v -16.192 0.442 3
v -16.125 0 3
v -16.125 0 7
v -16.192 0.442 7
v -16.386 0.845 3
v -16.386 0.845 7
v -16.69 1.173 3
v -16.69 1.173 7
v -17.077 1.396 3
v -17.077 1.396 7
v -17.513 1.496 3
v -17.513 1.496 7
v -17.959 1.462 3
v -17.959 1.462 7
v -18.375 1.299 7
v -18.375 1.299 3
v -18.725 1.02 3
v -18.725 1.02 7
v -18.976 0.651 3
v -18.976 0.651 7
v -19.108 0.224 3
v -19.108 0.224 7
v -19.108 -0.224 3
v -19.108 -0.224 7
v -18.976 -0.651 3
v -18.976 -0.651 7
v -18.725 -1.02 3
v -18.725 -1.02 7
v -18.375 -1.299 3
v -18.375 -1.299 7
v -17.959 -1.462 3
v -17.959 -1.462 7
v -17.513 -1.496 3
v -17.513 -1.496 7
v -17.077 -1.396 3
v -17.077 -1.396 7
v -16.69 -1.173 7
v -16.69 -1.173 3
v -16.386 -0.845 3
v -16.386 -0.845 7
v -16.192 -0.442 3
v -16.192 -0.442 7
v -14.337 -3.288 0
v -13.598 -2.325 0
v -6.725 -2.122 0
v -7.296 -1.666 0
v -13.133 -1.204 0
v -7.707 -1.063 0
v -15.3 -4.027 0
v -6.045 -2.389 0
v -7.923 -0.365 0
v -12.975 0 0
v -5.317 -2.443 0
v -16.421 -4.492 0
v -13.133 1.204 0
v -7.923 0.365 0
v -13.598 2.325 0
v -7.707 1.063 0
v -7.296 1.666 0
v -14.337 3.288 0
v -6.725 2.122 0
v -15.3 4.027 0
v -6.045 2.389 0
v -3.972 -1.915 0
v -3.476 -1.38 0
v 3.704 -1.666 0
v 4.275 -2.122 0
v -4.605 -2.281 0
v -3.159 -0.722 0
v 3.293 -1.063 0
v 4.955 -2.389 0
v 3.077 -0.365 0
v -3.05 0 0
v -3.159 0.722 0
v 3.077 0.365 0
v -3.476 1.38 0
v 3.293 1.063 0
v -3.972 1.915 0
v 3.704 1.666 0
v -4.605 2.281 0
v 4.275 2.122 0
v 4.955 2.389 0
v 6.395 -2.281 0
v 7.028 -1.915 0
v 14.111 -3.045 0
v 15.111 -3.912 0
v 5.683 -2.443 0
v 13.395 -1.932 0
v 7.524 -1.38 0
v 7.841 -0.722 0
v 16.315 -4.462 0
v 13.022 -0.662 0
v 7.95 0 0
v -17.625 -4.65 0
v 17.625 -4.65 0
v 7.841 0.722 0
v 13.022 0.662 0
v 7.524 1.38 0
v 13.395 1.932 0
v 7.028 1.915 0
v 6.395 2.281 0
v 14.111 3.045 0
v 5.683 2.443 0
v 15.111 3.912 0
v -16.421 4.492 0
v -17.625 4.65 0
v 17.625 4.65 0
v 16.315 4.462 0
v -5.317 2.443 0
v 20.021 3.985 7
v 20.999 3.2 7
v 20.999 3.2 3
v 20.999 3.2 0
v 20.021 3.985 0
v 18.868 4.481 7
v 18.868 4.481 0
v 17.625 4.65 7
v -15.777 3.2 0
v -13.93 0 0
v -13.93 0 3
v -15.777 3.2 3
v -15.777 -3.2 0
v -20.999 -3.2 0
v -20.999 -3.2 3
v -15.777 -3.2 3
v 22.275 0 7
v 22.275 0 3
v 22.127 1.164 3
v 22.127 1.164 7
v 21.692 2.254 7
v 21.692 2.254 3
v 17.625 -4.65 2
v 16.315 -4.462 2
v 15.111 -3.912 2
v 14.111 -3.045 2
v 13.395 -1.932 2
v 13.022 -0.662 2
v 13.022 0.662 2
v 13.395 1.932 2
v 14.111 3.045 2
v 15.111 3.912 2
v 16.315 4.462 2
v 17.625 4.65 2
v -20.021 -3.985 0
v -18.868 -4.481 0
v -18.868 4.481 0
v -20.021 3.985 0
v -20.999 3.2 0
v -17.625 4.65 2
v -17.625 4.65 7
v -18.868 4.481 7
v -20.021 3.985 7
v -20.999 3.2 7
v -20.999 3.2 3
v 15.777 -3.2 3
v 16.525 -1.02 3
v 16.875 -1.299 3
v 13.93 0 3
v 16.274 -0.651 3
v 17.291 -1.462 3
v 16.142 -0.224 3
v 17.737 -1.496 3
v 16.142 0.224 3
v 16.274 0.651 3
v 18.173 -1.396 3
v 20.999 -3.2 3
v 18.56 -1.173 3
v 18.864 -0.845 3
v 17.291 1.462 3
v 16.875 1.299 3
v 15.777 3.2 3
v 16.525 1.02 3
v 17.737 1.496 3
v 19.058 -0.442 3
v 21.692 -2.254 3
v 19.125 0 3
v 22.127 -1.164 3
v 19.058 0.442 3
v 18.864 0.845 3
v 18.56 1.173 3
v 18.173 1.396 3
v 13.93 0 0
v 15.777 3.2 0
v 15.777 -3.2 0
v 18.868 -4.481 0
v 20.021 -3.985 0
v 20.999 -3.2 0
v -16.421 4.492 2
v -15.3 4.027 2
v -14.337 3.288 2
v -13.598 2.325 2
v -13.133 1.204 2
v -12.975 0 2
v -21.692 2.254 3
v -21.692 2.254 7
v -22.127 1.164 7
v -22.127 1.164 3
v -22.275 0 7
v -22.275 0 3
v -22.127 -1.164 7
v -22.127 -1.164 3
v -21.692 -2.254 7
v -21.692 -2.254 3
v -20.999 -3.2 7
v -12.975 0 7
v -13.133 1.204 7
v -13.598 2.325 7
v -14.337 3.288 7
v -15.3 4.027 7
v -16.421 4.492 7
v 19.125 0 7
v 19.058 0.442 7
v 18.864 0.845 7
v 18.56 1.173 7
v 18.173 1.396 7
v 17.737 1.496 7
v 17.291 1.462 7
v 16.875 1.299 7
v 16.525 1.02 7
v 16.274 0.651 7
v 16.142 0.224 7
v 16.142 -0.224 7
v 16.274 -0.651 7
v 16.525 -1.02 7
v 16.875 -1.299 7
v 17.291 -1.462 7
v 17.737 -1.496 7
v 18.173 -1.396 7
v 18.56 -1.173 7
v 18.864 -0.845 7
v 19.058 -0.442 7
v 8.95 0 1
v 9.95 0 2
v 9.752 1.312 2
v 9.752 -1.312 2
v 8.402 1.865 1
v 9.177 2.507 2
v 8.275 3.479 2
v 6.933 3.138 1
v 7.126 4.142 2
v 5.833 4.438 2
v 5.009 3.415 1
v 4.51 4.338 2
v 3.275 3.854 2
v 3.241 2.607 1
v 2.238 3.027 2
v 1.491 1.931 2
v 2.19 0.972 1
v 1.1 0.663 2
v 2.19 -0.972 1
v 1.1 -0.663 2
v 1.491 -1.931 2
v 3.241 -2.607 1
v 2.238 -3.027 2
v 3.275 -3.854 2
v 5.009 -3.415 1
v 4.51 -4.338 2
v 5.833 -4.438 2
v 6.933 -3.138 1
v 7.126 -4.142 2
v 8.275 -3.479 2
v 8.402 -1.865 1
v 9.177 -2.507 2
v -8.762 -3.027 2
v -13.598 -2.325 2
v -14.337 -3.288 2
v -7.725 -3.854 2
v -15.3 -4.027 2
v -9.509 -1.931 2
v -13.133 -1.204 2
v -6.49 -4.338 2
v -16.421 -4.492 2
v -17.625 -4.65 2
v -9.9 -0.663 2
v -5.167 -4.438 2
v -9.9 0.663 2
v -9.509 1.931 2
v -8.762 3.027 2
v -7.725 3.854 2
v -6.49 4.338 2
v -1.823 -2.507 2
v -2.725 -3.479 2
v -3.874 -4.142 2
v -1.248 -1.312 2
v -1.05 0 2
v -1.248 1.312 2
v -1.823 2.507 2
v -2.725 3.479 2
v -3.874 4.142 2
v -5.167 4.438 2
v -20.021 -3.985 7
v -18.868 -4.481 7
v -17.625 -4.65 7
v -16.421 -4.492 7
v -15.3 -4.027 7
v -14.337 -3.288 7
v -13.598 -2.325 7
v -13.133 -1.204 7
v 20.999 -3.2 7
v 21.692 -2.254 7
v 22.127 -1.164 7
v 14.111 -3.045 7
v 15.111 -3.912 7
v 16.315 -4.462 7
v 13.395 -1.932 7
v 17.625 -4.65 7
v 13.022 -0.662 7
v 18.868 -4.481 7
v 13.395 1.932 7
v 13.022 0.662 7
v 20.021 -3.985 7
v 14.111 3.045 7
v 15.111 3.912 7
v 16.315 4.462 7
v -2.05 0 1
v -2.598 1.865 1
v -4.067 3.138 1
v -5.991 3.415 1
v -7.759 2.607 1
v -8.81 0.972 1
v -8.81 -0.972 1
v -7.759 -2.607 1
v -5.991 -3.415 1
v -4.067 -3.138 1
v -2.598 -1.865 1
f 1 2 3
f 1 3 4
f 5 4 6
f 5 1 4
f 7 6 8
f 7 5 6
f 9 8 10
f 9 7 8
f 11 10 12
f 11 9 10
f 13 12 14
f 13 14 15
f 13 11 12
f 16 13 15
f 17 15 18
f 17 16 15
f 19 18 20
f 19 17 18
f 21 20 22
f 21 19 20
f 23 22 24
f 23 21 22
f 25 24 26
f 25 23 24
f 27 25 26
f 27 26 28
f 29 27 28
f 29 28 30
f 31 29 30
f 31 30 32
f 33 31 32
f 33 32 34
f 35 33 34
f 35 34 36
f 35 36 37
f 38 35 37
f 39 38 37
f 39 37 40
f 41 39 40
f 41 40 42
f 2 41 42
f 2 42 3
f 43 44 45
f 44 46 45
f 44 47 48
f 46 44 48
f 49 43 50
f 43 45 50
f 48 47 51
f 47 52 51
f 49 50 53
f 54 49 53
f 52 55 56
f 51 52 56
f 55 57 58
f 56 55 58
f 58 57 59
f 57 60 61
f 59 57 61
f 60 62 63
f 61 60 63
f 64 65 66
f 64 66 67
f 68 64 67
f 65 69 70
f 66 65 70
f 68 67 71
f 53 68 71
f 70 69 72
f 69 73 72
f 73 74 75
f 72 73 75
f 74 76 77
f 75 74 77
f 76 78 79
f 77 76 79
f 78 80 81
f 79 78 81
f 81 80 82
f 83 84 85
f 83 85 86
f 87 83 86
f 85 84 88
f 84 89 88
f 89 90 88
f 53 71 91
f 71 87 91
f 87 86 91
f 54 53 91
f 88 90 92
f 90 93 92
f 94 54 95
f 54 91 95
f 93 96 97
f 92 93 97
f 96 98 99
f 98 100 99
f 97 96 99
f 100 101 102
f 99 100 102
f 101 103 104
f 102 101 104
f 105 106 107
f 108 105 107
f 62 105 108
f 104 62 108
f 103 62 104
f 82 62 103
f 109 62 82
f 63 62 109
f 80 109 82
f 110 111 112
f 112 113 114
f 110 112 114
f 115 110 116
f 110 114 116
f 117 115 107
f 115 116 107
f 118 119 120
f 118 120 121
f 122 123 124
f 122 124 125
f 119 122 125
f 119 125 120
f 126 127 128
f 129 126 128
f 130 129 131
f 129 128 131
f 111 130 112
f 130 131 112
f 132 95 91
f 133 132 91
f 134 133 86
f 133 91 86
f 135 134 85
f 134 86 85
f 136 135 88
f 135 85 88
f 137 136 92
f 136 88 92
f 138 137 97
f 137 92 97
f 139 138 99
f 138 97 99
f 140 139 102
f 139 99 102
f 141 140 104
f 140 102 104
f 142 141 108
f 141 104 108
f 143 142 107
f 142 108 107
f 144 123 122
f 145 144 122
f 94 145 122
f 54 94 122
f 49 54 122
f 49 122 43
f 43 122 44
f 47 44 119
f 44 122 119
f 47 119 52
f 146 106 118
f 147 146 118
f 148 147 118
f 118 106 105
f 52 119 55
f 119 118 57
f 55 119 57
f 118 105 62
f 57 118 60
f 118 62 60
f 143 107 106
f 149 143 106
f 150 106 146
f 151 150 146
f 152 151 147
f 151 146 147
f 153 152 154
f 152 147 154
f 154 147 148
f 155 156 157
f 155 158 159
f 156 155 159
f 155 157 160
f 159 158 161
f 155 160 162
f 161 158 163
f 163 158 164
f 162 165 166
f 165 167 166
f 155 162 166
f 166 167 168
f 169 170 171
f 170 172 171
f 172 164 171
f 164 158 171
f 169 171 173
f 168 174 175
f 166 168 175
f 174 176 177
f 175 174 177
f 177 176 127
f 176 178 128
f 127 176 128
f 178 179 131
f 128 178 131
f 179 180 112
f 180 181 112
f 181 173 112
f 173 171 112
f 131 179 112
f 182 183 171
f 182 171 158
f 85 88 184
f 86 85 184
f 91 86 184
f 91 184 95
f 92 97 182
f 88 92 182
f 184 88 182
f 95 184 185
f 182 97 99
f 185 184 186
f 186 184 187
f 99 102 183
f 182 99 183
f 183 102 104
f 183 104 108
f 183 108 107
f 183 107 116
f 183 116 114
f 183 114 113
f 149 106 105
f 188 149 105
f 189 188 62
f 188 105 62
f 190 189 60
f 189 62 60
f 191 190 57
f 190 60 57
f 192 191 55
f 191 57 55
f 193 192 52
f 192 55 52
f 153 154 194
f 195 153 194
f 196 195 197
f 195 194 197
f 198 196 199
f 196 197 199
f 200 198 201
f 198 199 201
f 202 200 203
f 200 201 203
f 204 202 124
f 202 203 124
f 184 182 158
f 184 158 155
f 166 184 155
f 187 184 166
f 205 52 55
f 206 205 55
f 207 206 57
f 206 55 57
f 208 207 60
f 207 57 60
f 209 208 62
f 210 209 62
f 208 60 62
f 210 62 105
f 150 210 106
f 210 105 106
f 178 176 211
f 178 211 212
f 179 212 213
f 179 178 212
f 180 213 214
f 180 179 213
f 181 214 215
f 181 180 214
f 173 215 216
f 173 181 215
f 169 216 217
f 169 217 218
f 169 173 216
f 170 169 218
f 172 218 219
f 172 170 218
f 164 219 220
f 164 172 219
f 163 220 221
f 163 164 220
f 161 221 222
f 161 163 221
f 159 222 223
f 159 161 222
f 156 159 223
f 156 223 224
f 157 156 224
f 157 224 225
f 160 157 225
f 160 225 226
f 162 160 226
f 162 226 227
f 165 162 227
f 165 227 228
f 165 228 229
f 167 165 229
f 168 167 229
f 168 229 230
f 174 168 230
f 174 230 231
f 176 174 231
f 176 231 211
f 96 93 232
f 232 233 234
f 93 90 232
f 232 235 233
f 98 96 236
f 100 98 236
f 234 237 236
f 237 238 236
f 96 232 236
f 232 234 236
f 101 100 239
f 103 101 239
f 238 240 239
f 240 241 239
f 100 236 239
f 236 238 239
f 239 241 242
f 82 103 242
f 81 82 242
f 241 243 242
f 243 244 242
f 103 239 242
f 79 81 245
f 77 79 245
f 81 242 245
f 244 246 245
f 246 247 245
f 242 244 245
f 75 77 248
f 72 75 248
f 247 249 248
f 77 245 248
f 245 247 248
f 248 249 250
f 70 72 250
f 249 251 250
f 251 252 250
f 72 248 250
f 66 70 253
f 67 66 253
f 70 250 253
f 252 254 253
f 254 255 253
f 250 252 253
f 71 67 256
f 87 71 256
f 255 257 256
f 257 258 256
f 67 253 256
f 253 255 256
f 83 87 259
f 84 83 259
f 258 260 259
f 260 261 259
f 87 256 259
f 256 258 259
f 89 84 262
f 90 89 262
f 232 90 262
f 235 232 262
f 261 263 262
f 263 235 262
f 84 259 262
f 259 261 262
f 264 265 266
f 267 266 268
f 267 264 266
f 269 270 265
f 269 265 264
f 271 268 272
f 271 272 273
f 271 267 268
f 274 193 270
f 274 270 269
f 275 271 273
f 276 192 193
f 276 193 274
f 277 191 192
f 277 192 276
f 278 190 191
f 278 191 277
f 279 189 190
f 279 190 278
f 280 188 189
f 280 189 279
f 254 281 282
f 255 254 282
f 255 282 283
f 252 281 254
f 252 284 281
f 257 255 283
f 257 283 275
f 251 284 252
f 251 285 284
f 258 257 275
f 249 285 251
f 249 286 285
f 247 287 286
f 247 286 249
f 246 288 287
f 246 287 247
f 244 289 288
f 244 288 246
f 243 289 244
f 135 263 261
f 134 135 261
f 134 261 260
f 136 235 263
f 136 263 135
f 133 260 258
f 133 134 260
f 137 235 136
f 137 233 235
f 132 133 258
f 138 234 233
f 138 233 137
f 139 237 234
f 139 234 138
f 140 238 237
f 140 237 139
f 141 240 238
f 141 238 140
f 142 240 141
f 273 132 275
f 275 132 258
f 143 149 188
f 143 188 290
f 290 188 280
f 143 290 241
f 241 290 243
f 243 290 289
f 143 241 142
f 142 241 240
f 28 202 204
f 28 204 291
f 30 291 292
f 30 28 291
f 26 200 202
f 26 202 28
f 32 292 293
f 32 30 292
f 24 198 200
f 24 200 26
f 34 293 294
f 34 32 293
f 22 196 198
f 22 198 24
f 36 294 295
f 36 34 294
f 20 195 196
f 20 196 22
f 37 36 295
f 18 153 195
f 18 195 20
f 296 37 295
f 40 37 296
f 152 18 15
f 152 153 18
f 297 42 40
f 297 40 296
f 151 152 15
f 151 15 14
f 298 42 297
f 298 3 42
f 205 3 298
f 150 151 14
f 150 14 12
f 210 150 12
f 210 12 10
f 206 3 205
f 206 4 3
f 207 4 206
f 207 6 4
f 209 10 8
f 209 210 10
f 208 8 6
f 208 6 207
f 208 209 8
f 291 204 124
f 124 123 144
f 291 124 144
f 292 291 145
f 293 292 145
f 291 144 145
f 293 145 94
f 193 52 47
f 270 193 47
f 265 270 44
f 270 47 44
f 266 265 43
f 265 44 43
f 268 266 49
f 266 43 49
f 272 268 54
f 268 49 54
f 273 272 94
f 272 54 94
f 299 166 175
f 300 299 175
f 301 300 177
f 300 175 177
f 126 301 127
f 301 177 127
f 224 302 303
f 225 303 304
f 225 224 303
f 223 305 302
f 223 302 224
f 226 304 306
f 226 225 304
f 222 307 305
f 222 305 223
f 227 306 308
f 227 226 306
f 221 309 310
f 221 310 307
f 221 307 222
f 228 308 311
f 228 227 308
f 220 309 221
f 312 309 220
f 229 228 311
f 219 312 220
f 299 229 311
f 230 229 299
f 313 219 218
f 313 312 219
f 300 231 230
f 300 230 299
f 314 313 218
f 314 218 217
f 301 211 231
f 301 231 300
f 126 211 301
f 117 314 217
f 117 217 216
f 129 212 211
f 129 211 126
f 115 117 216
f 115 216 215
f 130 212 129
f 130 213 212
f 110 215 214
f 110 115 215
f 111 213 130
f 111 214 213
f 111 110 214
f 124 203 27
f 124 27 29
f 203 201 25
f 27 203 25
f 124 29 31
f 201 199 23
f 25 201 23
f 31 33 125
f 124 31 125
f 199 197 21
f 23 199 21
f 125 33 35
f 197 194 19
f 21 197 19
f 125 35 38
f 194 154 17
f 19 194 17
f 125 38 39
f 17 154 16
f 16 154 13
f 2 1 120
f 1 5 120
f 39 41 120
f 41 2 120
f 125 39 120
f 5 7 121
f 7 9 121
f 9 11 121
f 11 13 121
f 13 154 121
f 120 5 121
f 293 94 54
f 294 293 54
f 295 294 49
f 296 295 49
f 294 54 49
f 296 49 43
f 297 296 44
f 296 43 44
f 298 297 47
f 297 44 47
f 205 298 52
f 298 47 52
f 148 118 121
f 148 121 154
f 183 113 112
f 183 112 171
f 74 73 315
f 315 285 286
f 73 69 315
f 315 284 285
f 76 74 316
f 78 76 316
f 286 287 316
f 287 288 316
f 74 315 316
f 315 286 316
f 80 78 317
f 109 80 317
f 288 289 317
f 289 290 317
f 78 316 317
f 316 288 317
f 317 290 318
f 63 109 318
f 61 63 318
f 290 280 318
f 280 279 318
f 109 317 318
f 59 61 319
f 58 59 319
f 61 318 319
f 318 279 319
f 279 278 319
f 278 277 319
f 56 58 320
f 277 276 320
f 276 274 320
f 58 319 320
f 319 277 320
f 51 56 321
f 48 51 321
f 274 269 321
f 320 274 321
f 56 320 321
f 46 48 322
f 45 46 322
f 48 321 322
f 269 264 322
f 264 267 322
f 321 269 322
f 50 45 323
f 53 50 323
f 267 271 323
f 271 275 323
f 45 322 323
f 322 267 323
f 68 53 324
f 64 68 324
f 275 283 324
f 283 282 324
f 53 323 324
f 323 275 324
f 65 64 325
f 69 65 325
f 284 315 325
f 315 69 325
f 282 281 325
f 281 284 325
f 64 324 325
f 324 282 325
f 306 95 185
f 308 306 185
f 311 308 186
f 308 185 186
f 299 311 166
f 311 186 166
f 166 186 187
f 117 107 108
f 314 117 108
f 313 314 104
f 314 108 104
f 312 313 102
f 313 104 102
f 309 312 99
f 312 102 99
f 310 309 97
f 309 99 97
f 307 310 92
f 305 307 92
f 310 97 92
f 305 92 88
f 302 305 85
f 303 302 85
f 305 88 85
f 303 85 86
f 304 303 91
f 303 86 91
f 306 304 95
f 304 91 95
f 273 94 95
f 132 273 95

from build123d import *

# Parameters (mm, degrees)
F0_R     = 1.5
F1_DEPTH = 7
F0_R_2   = 2.15
F2_DEPTH = 2
F4_DEPTH = 3


# Not quite as in the source:
# - a fillet or chamfer that OpenCascade refuses, or shapes differently, is made with other operations: its cross-section is extruded or revolved along the edge and cut away or added
# - ends of sketch curves that miss each other by under 0.0002 mm in the source are joined
# - a feature names something its author has since deleted; it is built from what else it names


with BuildPart() as f1:
    # F0 (on Top) → F1 (new body)
    with BuildSketch(Plane.XY):
        with BuildLine():
            Line((-15.7774791386, 3.2), (-20.9987960816, 3.2))
            ThreePointArc((-20.9987960816, 3.2), (-22.275, 0), (-20.9987960816, -3.2))
            Line((-20.9987960816, -3.2), (-15.7774791386, -3.2))
            Line((-15.7774791386, -3.2), (-13.9299582772, 0))
            Line((-13.9299582772, 0), (-15.7774791386, 3.2))
        make_face()
        with Locations((-17.625, 0)):
            Circle(F0_R, mode=Mode.SUBTRACT)
        with BuildLine():
            ThreePointArc((-17.625, -4.65), (-14.3369534675, -3.2880465325), (-12.975, 0))
            ThreePointArc((-12.975, 0), (-14.3369534675, 3.2880465325), (-17.625, 4.65))
            ThreePointArc((-17.625, 4.65), (-19.4610964027, 4.2721481716), (-20.9987960816, 3.2))
            Line((-20.9987960816, 3.2), (-15.7774791386, 3.2))
            Line((-15.7774791386, 3.2), (-13.9299582772, 0))
            Line((-13.9299582772, 0), (-15.7774791386, -3.2))
            Line((-15.7774791386, -3.2), (-20.9987960816, -3.2))
            ThreePointArc((-20.9987960816, -3.2), (-19.4610964027, -4.2721481716), (-17.625, -4.65))
        make_face()
    extrude(amount=F1_DEPTH)


with BuildPart() as f1b:
    # F0 (on Top) → F1, piece 2 (new body)
    with BuildSketch(Plane.XY):
        with BuildLine():
            ThreePointArc((20.9987962368, 3.1999998363), (19.4610965063, 4.272148127), (17.625, 4.65))
            ThreePointArc((17.625, 4.65), (12.975, 0), (17.625, -4.65))
            ThreePointArc((17.625, -4.65), (19.4610965063, -4.272148127), (20.9987962368, -3.1999998363))
            Line((20.9987962368, -3.1999998363), (15.7774794664, -3.2))
            Line((15.7774794664, -3.2), (13.929958605, 0))
            Line((13.929958605, 0), (15.7774794664, 3.2))
            Line((15.7774794664, 3.2), (20.9987962368, 3.1999998363))
        make_face()
        with BuildLine():
            ThreePointArc((22.275, 0), (21.9441812014, 1.7225486203), (20.9987962368, 3.1999998363))
            Line((20.9987962368, 3.1999998363), (15.7774794664, 3.2))
            Line((15.7774794664, 3.2), (13.929958605, 0))
            Line((13.929958605, 0), (15.7774794664, -3.2))
            Line((15.7774794664, -3.2), (20.9987964094, -3.2))
            ThreePointArc((20.9987964094, -3.2), (21.9441812014, -1.7225486203), (22.275, 0))
        make_face()
        with Locations((17.625, 0)):
            Circle(F0_R, mode=Mode.SUBTRACT)
    extrude(amount=F1_DEPTH)


with BuildPart() as f2:
    # F0 (on Top) → F2 (new body)
    with BuildSketch(Plane.XY):
        with BuildLine():
            ThreePointArc((-17.625, 4.65), (-14.3369534675, 3.2880465325), (-12.975, 0))
            ThreePointArc((-12.975, 0), (-14.3369534675, -3.2880465325), (-17.625, -4.65))
            Line((-17.625, -4.65), (17.625, -4.65))
            ThreePointArc((17.625, -4.65), (12.975, 0), (17.625, 4.65))
            Line((17.625, 4.65), (-17.625, 4.65))
        make_face()
        with Locations((-5.5, 0)):
            Circle(F0_R_2, mode=Mode.SUBTRACT)
        with Locations((5.5, 0)):
            Circle(F0_R_2, mode=Mode.SUBTRACT)
    extrude(amount=F2_DEPTH)

    # F3: chamfer of 2.3 on 2 edges, made by hand

    # F3_s1 → F3_t2 (revolve, cut)
    with BuildSketch(Plane.XZ):
        Polygon((-3.35, -0.3), (-1.05, 2), (-3.35, 2), align=None)
    revolve(axis=Axis((-5.5, 0, 2), (0, 0, 1)), mode=Mode.SUBTRACT)

    # F3_s3 → F3_t4 (revolve, cut)
    with BuildSketch(Plane.XZ):
        Polygon((7.65, -0.3), (9.95, 2), (7.65, 2), align=None)
    revolve(axis=Axis((5.5, 0, 2), (0, 0, 1)), mode=Mode.SUBTRACT)


with BuildPart() as f4_tool:
    # F0 (on Top) → F4 (new body)
    with BuildSketch(Plane.XY):
        with BuildLine():
            Line((-15.7774791386, 3.2), (-20.9987960816, 3.2))
            ThreePointArc((-20.9987960816, 3.2), (-22.275, 0), (-20.9987960816, -3.2))
            Line((-20.9987960816, -3.2), (-15.7774791386, -3.2))
            Line((-15.7774791386, -3.2), (-13.9299582772, 0))
            Line((-13.9299582772, 0), (-15.7774791386, 3.2))
        make_face()
        with Locations((-17.625, 0)):
            Circle(F0_R, mode=Mode.SUBTRACT)
        with BuildLine():
            ThreePointArc((22.275, 0), (21.9441812014, 1.7225486203), (20.9987962368, 3.1999998363))
            Line((20.9987962368, 3.1999998363), (15.7774794664, 3.2))
            Line((15.7774794664, 3.2), (13.929958605, 0))
            Line((13.929958605, 0), (15.7774794664, -3.2))
            Line((15.7774794664, -3.2), (20.9987964094, -3.2))
            ThreePointArc((20.9987964094, -3.2), (21.9441812014, -1.7225486203), (22.275, 0))
        make_face()
        with Locations((17.625, 0)):
            Circle(F0_R, mode=Mode.SUBTRACT)
    extrude(amount=F4_DEPTH)


with BuildPart() as f1_1:
    add(f1.part)

    # F4: cut by f4_tool
    add(f4_tool.part, mode=Mode.SUBTRACT)


with BuildPart() as f1b_1:
    add(f1b.part)

    # F4: cut by f4_tool
    add(f4_tool.part, mode=Mode.SUBTRACT)


solid = Compound([f2.part, f1_1.part, f1b_1.part])
